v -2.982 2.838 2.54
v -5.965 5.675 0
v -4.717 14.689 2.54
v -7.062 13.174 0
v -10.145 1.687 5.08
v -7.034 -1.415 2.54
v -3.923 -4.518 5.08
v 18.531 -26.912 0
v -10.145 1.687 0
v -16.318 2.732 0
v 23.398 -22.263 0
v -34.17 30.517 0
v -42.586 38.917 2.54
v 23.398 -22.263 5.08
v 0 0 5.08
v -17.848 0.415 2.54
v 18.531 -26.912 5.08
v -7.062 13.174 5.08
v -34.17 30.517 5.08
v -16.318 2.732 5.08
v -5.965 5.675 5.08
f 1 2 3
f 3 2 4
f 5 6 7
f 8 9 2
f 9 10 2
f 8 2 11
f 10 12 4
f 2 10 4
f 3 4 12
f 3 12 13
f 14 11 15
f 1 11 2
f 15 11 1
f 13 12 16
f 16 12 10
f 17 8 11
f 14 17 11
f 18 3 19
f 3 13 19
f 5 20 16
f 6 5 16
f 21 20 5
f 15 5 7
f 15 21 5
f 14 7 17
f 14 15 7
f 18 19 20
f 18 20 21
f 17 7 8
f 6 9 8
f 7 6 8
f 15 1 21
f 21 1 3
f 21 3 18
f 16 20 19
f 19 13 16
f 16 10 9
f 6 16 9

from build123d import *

# Parameters (mm, degrees)
F4_DEPTH     = 5.08
F5_SIZE2     = 5.07999
F5_SIZE      = 5.07999
F6_T1_DEPTH  = 83.8598569958
F6_T3_DEPTH  = 84.6306377444
F6_T8_DEPTH  = 42.5046669686
F6_T13_DEPTH = 41.8031738059


# Not quite as in the source:
# - a fillet or chamfer that OpenCascade refuses, or shapes differently, is made with other operations: its cross-section is extruded or revolved along the edge and cut away or added
# - a fillet or chamfer is up to 0.001 mm smaller than in the source, because OpenCascade refuses the exact size
# - the program builds the solid bodies; features that only make, move or delete a surface that nothing else refers to are left out


with BuildPart() as f4:
    # F0 (on Top) → F4 (new body)
    with BuildSketch(Plane.XY):
        Polygon((-2.3713386618, 16.203770414), (-51.0019175708, 47.3164618015), (-19.3783510476, -1.9021694316), (-3.9232242852, -4.51765256), (18.5309383262, -26.9124830378), (23.3981461688, -22.2631122398), (0, 0), align=None)
    extrude(amount=F4_DEPTH)

    # F5 (size 5.08 and 5.08 in the source; OpenCascade refuses exactly that, so slightly less here)
    f5_edges = [f4.edges().sort_by_distance(p)[0] for p in [
        (-11.650788, -3.209911, 0),
        (-35.190134, 22.707146, 0),
        (-26.686628, 31.760116, 0),
        (-1.185669, 8.101885, 0),
    ]]
    chamfer(f5_edges, length=F5_SIZE, length2=F5_SIZE2)

    # F6: chamfer of 5.08 on 4 edges, made by hand

    # F6_s2 → F6_t1 (cut)
    with BuildSketch(Plane(origin=(1.9661453214, -1.2578931606, 0), x_dir=(0, 0, 1), z_dir=(-0.8423569488, 0.5389200041, 0))):
        Polygon((0, 12.3713967634), (5.08, 7.2913967634), (5.08, 12.3713967634), align=None)
    extrude(amount=F6_T1_DEPTH, mode=Mode.SUBTRACT)

    # F6_s4 → F6_t3 (cut)
    with BuildSketch(Plane(origin=(-43.4826566064, 67.6760111474, 0), x_dir=(0, 0, 1), z_dir=(0.5405521777, -0.8413104915, 0))):
        Polygon((5.08, 12.2514318739), (0, 17.3314318739), (5.08, 17.3314318739), align=None)
    extrude(amount=F6_T3_DEPTH, mode=Mode.SUBTRACT)


with BuildPart() as f6_tool6:
    # F6_s7 → F6_t8 (new body)
    with BuildSketch(Plane(origin=(1.8917212496, -12.9264610367, 0), x_dir=(0, 0, 1), z_dir=(-0.1448024793, 0.9894605813, 0))):
        Polygon((0, 0), (5.08, -5.08), (5.08, 0), align=None)
    extrude(amount=F6_T8_DEPTH)

    split(bisect_by=Plane(origin=(0, 0, 0), x_dir=(0, 0, 1), z_dir=(0.6893167986, 0.7244600411, 0)), keep=Keep.TOP)


with BuildPart() as f4_1:
    add(f4.part)

    # F6_t5: cut F6_tool6
    add(f6_tool6.part, mode=Mode.SUBTRACT)


with BuildPart() as f6_tool11:
    # F6_s12 → F6_t13 (new body)
    with BuildSketch(Plane(origin=(-31.4068834176, 5.3150113201, 0), x_dir=(0, 0, 1), z_dir=(0.985980884, -0.1668583122, 0))):
        Polygon((5.08, 0.0289416476), (0, 5.1089416476), (5.08, 5.1089416476), align=None)
    extrude(amount=F6_T13_DEPTH)

    split(bisect_by=Plane(origin=(-4.2152403692, -4.2264080896, 0), x_dir=(0, 0, 1), z_dir=(-0.7061707096, -0.7080416152, 0)), keep=Keep.TOP)


with BuildPart() as f4_2:
    add(f4_1.part)

    # F6_t10: cut F6_tool11
    add(f6_tool11.part, mode=Mode.SUBTRACT)


solid = f4_2.part
